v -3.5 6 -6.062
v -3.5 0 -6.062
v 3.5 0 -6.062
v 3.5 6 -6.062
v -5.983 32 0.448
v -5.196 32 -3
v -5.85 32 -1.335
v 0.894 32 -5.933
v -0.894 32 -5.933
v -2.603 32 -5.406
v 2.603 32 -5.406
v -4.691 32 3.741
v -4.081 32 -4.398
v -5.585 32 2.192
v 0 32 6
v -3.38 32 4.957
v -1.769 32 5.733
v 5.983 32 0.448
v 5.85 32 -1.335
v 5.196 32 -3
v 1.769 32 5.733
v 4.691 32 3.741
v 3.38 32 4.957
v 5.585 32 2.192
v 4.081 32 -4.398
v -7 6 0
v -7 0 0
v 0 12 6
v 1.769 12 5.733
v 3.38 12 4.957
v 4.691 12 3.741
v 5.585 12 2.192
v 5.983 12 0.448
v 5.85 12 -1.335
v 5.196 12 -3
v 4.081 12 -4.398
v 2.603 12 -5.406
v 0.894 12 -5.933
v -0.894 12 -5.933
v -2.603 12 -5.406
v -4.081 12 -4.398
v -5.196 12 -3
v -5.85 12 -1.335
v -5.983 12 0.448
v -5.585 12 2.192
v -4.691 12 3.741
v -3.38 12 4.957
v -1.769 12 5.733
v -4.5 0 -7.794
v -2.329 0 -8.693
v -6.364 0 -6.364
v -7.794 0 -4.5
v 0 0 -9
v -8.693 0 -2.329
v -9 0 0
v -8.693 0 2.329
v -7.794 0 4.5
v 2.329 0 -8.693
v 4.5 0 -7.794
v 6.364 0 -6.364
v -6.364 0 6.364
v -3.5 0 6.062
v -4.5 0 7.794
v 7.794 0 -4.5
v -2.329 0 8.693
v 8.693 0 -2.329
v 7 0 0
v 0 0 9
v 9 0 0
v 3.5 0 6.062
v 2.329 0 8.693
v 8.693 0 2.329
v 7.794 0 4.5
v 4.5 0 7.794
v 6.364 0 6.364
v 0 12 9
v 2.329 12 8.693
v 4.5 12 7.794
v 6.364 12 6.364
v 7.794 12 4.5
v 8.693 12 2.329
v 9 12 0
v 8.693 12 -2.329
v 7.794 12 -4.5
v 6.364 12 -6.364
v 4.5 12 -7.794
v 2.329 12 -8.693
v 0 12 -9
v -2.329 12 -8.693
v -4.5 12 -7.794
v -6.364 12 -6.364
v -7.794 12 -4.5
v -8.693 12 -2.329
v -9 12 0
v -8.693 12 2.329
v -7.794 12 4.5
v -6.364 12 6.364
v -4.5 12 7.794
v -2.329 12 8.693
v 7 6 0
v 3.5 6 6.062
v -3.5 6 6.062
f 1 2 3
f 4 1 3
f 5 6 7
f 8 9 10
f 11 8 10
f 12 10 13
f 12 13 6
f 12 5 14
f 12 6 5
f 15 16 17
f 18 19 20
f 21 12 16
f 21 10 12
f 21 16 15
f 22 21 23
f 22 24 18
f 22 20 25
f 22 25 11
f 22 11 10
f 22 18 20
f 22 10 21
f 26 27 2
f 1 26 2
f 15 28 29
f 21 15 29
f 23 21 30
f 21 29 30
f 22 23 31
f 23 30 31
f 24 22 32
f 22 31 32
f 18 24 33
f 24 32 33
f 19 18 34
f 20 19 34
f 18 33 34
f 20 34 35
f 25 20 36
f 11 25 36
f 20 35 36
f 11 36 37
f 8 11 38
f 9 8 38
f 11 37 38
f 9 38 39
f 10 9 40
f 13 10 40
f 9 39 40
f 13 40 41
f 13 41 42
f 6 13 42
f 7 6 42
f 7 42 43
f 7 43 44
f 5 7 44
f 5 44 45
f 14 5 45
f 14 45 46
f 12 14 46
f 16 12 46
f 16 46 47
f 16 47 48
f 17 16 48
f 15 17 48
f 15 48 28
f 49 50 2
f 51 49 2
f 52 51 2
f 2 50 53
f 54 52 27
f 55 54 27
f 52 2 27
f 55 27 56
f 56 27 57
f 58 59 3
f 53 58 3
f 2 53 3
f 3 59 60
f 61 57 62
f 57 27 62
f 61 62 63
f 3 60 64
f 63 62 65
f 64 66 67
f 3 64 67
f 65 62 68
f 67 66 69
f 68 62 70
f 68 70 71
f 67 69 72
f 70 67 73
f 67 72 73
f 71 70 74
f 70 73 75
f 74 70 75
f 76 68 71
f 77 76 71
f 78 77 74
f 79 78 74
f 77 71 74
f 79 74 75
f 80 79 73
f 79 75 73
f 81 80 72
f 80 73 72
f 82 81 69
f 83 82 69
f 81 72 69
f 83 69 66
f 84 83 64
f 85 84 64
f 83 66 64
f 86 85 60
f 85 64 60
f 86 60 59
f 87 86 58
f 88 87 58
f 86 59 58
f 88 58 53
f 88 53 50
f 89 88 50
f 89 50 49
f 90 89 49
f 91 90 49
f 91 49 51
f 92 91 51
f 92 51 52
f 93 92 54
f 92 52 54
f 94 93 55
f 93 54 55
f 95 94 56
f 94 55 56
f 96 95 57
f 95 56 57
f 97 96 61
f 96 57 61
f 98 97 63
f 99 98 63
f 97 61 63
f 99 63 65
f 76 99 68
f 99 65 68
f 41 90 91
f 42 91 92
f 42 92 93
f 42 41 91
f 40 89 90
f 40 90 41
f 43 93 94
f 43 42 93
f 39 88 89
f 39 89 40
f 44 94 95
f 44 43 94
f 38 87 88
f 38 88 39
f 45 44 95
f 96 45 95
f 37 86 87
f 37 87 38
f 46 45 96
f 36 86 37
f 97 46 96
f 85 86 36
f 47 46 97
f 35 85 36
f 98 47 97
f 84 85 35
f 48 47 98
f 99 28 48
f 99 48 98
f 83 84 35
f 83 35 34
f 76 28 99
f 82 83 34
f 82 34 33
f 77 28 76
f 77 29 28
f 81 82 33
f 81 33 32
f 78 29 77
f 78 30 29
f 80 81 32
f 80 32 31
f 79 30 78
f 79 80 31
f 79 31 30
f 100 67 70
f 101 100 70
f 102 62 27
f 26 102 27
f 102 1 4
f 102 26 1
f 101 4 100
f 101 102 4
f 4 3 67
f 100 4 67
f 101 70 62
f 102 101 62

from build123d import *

# Parameters (mm, degrees)
SKETCH1_R           = 9
BOSS_EXTRUDE1_DEPTH = 12
SKETCH1_3_R         = 6
BOSS_EXTRUDE2_DEPTH = 32
CUT_EXTRUDE1_DEPTH  = 6


with BuildPart() as part:
    # Sketch1 → Boss-Extrude1 (new body)
    with BuildSketch(Plane(origin=(0, 0, 0), x_dir=(1, 0, 0), z_dir=(0, 1, 0))):
        Circle(SKETCH1_R)
    extrude(amount=BOSS_EXTRUDE1_DEPTH)

    # Sketch1<3> → Boss-Extrude2 (add)
    with BuildSketch(Plane(origin=(0, 0, 0), x_dir=(1, 0, 0), z_dir=(0, 1, 0))):
        Circle(SKETCH1_3_R)
    extrude(amount=BOSS_EXTRUDE2_DEPTH)

    # Sketch2 → Cut-Extrude1 (cut)
    with BuildSketch(Plane.XZ):
        Polygon((-3.5, -6.062177826), (3.5, -6.062177826), (7, 0), (3.5, 6.062177826), (-3.5, 6.062177826), (-7, 0), align=None)
    extrude(amount=-CUT_EXTRUDE1_DEPTH, mode=Mode.SUBTRACT)


solid = part.part
